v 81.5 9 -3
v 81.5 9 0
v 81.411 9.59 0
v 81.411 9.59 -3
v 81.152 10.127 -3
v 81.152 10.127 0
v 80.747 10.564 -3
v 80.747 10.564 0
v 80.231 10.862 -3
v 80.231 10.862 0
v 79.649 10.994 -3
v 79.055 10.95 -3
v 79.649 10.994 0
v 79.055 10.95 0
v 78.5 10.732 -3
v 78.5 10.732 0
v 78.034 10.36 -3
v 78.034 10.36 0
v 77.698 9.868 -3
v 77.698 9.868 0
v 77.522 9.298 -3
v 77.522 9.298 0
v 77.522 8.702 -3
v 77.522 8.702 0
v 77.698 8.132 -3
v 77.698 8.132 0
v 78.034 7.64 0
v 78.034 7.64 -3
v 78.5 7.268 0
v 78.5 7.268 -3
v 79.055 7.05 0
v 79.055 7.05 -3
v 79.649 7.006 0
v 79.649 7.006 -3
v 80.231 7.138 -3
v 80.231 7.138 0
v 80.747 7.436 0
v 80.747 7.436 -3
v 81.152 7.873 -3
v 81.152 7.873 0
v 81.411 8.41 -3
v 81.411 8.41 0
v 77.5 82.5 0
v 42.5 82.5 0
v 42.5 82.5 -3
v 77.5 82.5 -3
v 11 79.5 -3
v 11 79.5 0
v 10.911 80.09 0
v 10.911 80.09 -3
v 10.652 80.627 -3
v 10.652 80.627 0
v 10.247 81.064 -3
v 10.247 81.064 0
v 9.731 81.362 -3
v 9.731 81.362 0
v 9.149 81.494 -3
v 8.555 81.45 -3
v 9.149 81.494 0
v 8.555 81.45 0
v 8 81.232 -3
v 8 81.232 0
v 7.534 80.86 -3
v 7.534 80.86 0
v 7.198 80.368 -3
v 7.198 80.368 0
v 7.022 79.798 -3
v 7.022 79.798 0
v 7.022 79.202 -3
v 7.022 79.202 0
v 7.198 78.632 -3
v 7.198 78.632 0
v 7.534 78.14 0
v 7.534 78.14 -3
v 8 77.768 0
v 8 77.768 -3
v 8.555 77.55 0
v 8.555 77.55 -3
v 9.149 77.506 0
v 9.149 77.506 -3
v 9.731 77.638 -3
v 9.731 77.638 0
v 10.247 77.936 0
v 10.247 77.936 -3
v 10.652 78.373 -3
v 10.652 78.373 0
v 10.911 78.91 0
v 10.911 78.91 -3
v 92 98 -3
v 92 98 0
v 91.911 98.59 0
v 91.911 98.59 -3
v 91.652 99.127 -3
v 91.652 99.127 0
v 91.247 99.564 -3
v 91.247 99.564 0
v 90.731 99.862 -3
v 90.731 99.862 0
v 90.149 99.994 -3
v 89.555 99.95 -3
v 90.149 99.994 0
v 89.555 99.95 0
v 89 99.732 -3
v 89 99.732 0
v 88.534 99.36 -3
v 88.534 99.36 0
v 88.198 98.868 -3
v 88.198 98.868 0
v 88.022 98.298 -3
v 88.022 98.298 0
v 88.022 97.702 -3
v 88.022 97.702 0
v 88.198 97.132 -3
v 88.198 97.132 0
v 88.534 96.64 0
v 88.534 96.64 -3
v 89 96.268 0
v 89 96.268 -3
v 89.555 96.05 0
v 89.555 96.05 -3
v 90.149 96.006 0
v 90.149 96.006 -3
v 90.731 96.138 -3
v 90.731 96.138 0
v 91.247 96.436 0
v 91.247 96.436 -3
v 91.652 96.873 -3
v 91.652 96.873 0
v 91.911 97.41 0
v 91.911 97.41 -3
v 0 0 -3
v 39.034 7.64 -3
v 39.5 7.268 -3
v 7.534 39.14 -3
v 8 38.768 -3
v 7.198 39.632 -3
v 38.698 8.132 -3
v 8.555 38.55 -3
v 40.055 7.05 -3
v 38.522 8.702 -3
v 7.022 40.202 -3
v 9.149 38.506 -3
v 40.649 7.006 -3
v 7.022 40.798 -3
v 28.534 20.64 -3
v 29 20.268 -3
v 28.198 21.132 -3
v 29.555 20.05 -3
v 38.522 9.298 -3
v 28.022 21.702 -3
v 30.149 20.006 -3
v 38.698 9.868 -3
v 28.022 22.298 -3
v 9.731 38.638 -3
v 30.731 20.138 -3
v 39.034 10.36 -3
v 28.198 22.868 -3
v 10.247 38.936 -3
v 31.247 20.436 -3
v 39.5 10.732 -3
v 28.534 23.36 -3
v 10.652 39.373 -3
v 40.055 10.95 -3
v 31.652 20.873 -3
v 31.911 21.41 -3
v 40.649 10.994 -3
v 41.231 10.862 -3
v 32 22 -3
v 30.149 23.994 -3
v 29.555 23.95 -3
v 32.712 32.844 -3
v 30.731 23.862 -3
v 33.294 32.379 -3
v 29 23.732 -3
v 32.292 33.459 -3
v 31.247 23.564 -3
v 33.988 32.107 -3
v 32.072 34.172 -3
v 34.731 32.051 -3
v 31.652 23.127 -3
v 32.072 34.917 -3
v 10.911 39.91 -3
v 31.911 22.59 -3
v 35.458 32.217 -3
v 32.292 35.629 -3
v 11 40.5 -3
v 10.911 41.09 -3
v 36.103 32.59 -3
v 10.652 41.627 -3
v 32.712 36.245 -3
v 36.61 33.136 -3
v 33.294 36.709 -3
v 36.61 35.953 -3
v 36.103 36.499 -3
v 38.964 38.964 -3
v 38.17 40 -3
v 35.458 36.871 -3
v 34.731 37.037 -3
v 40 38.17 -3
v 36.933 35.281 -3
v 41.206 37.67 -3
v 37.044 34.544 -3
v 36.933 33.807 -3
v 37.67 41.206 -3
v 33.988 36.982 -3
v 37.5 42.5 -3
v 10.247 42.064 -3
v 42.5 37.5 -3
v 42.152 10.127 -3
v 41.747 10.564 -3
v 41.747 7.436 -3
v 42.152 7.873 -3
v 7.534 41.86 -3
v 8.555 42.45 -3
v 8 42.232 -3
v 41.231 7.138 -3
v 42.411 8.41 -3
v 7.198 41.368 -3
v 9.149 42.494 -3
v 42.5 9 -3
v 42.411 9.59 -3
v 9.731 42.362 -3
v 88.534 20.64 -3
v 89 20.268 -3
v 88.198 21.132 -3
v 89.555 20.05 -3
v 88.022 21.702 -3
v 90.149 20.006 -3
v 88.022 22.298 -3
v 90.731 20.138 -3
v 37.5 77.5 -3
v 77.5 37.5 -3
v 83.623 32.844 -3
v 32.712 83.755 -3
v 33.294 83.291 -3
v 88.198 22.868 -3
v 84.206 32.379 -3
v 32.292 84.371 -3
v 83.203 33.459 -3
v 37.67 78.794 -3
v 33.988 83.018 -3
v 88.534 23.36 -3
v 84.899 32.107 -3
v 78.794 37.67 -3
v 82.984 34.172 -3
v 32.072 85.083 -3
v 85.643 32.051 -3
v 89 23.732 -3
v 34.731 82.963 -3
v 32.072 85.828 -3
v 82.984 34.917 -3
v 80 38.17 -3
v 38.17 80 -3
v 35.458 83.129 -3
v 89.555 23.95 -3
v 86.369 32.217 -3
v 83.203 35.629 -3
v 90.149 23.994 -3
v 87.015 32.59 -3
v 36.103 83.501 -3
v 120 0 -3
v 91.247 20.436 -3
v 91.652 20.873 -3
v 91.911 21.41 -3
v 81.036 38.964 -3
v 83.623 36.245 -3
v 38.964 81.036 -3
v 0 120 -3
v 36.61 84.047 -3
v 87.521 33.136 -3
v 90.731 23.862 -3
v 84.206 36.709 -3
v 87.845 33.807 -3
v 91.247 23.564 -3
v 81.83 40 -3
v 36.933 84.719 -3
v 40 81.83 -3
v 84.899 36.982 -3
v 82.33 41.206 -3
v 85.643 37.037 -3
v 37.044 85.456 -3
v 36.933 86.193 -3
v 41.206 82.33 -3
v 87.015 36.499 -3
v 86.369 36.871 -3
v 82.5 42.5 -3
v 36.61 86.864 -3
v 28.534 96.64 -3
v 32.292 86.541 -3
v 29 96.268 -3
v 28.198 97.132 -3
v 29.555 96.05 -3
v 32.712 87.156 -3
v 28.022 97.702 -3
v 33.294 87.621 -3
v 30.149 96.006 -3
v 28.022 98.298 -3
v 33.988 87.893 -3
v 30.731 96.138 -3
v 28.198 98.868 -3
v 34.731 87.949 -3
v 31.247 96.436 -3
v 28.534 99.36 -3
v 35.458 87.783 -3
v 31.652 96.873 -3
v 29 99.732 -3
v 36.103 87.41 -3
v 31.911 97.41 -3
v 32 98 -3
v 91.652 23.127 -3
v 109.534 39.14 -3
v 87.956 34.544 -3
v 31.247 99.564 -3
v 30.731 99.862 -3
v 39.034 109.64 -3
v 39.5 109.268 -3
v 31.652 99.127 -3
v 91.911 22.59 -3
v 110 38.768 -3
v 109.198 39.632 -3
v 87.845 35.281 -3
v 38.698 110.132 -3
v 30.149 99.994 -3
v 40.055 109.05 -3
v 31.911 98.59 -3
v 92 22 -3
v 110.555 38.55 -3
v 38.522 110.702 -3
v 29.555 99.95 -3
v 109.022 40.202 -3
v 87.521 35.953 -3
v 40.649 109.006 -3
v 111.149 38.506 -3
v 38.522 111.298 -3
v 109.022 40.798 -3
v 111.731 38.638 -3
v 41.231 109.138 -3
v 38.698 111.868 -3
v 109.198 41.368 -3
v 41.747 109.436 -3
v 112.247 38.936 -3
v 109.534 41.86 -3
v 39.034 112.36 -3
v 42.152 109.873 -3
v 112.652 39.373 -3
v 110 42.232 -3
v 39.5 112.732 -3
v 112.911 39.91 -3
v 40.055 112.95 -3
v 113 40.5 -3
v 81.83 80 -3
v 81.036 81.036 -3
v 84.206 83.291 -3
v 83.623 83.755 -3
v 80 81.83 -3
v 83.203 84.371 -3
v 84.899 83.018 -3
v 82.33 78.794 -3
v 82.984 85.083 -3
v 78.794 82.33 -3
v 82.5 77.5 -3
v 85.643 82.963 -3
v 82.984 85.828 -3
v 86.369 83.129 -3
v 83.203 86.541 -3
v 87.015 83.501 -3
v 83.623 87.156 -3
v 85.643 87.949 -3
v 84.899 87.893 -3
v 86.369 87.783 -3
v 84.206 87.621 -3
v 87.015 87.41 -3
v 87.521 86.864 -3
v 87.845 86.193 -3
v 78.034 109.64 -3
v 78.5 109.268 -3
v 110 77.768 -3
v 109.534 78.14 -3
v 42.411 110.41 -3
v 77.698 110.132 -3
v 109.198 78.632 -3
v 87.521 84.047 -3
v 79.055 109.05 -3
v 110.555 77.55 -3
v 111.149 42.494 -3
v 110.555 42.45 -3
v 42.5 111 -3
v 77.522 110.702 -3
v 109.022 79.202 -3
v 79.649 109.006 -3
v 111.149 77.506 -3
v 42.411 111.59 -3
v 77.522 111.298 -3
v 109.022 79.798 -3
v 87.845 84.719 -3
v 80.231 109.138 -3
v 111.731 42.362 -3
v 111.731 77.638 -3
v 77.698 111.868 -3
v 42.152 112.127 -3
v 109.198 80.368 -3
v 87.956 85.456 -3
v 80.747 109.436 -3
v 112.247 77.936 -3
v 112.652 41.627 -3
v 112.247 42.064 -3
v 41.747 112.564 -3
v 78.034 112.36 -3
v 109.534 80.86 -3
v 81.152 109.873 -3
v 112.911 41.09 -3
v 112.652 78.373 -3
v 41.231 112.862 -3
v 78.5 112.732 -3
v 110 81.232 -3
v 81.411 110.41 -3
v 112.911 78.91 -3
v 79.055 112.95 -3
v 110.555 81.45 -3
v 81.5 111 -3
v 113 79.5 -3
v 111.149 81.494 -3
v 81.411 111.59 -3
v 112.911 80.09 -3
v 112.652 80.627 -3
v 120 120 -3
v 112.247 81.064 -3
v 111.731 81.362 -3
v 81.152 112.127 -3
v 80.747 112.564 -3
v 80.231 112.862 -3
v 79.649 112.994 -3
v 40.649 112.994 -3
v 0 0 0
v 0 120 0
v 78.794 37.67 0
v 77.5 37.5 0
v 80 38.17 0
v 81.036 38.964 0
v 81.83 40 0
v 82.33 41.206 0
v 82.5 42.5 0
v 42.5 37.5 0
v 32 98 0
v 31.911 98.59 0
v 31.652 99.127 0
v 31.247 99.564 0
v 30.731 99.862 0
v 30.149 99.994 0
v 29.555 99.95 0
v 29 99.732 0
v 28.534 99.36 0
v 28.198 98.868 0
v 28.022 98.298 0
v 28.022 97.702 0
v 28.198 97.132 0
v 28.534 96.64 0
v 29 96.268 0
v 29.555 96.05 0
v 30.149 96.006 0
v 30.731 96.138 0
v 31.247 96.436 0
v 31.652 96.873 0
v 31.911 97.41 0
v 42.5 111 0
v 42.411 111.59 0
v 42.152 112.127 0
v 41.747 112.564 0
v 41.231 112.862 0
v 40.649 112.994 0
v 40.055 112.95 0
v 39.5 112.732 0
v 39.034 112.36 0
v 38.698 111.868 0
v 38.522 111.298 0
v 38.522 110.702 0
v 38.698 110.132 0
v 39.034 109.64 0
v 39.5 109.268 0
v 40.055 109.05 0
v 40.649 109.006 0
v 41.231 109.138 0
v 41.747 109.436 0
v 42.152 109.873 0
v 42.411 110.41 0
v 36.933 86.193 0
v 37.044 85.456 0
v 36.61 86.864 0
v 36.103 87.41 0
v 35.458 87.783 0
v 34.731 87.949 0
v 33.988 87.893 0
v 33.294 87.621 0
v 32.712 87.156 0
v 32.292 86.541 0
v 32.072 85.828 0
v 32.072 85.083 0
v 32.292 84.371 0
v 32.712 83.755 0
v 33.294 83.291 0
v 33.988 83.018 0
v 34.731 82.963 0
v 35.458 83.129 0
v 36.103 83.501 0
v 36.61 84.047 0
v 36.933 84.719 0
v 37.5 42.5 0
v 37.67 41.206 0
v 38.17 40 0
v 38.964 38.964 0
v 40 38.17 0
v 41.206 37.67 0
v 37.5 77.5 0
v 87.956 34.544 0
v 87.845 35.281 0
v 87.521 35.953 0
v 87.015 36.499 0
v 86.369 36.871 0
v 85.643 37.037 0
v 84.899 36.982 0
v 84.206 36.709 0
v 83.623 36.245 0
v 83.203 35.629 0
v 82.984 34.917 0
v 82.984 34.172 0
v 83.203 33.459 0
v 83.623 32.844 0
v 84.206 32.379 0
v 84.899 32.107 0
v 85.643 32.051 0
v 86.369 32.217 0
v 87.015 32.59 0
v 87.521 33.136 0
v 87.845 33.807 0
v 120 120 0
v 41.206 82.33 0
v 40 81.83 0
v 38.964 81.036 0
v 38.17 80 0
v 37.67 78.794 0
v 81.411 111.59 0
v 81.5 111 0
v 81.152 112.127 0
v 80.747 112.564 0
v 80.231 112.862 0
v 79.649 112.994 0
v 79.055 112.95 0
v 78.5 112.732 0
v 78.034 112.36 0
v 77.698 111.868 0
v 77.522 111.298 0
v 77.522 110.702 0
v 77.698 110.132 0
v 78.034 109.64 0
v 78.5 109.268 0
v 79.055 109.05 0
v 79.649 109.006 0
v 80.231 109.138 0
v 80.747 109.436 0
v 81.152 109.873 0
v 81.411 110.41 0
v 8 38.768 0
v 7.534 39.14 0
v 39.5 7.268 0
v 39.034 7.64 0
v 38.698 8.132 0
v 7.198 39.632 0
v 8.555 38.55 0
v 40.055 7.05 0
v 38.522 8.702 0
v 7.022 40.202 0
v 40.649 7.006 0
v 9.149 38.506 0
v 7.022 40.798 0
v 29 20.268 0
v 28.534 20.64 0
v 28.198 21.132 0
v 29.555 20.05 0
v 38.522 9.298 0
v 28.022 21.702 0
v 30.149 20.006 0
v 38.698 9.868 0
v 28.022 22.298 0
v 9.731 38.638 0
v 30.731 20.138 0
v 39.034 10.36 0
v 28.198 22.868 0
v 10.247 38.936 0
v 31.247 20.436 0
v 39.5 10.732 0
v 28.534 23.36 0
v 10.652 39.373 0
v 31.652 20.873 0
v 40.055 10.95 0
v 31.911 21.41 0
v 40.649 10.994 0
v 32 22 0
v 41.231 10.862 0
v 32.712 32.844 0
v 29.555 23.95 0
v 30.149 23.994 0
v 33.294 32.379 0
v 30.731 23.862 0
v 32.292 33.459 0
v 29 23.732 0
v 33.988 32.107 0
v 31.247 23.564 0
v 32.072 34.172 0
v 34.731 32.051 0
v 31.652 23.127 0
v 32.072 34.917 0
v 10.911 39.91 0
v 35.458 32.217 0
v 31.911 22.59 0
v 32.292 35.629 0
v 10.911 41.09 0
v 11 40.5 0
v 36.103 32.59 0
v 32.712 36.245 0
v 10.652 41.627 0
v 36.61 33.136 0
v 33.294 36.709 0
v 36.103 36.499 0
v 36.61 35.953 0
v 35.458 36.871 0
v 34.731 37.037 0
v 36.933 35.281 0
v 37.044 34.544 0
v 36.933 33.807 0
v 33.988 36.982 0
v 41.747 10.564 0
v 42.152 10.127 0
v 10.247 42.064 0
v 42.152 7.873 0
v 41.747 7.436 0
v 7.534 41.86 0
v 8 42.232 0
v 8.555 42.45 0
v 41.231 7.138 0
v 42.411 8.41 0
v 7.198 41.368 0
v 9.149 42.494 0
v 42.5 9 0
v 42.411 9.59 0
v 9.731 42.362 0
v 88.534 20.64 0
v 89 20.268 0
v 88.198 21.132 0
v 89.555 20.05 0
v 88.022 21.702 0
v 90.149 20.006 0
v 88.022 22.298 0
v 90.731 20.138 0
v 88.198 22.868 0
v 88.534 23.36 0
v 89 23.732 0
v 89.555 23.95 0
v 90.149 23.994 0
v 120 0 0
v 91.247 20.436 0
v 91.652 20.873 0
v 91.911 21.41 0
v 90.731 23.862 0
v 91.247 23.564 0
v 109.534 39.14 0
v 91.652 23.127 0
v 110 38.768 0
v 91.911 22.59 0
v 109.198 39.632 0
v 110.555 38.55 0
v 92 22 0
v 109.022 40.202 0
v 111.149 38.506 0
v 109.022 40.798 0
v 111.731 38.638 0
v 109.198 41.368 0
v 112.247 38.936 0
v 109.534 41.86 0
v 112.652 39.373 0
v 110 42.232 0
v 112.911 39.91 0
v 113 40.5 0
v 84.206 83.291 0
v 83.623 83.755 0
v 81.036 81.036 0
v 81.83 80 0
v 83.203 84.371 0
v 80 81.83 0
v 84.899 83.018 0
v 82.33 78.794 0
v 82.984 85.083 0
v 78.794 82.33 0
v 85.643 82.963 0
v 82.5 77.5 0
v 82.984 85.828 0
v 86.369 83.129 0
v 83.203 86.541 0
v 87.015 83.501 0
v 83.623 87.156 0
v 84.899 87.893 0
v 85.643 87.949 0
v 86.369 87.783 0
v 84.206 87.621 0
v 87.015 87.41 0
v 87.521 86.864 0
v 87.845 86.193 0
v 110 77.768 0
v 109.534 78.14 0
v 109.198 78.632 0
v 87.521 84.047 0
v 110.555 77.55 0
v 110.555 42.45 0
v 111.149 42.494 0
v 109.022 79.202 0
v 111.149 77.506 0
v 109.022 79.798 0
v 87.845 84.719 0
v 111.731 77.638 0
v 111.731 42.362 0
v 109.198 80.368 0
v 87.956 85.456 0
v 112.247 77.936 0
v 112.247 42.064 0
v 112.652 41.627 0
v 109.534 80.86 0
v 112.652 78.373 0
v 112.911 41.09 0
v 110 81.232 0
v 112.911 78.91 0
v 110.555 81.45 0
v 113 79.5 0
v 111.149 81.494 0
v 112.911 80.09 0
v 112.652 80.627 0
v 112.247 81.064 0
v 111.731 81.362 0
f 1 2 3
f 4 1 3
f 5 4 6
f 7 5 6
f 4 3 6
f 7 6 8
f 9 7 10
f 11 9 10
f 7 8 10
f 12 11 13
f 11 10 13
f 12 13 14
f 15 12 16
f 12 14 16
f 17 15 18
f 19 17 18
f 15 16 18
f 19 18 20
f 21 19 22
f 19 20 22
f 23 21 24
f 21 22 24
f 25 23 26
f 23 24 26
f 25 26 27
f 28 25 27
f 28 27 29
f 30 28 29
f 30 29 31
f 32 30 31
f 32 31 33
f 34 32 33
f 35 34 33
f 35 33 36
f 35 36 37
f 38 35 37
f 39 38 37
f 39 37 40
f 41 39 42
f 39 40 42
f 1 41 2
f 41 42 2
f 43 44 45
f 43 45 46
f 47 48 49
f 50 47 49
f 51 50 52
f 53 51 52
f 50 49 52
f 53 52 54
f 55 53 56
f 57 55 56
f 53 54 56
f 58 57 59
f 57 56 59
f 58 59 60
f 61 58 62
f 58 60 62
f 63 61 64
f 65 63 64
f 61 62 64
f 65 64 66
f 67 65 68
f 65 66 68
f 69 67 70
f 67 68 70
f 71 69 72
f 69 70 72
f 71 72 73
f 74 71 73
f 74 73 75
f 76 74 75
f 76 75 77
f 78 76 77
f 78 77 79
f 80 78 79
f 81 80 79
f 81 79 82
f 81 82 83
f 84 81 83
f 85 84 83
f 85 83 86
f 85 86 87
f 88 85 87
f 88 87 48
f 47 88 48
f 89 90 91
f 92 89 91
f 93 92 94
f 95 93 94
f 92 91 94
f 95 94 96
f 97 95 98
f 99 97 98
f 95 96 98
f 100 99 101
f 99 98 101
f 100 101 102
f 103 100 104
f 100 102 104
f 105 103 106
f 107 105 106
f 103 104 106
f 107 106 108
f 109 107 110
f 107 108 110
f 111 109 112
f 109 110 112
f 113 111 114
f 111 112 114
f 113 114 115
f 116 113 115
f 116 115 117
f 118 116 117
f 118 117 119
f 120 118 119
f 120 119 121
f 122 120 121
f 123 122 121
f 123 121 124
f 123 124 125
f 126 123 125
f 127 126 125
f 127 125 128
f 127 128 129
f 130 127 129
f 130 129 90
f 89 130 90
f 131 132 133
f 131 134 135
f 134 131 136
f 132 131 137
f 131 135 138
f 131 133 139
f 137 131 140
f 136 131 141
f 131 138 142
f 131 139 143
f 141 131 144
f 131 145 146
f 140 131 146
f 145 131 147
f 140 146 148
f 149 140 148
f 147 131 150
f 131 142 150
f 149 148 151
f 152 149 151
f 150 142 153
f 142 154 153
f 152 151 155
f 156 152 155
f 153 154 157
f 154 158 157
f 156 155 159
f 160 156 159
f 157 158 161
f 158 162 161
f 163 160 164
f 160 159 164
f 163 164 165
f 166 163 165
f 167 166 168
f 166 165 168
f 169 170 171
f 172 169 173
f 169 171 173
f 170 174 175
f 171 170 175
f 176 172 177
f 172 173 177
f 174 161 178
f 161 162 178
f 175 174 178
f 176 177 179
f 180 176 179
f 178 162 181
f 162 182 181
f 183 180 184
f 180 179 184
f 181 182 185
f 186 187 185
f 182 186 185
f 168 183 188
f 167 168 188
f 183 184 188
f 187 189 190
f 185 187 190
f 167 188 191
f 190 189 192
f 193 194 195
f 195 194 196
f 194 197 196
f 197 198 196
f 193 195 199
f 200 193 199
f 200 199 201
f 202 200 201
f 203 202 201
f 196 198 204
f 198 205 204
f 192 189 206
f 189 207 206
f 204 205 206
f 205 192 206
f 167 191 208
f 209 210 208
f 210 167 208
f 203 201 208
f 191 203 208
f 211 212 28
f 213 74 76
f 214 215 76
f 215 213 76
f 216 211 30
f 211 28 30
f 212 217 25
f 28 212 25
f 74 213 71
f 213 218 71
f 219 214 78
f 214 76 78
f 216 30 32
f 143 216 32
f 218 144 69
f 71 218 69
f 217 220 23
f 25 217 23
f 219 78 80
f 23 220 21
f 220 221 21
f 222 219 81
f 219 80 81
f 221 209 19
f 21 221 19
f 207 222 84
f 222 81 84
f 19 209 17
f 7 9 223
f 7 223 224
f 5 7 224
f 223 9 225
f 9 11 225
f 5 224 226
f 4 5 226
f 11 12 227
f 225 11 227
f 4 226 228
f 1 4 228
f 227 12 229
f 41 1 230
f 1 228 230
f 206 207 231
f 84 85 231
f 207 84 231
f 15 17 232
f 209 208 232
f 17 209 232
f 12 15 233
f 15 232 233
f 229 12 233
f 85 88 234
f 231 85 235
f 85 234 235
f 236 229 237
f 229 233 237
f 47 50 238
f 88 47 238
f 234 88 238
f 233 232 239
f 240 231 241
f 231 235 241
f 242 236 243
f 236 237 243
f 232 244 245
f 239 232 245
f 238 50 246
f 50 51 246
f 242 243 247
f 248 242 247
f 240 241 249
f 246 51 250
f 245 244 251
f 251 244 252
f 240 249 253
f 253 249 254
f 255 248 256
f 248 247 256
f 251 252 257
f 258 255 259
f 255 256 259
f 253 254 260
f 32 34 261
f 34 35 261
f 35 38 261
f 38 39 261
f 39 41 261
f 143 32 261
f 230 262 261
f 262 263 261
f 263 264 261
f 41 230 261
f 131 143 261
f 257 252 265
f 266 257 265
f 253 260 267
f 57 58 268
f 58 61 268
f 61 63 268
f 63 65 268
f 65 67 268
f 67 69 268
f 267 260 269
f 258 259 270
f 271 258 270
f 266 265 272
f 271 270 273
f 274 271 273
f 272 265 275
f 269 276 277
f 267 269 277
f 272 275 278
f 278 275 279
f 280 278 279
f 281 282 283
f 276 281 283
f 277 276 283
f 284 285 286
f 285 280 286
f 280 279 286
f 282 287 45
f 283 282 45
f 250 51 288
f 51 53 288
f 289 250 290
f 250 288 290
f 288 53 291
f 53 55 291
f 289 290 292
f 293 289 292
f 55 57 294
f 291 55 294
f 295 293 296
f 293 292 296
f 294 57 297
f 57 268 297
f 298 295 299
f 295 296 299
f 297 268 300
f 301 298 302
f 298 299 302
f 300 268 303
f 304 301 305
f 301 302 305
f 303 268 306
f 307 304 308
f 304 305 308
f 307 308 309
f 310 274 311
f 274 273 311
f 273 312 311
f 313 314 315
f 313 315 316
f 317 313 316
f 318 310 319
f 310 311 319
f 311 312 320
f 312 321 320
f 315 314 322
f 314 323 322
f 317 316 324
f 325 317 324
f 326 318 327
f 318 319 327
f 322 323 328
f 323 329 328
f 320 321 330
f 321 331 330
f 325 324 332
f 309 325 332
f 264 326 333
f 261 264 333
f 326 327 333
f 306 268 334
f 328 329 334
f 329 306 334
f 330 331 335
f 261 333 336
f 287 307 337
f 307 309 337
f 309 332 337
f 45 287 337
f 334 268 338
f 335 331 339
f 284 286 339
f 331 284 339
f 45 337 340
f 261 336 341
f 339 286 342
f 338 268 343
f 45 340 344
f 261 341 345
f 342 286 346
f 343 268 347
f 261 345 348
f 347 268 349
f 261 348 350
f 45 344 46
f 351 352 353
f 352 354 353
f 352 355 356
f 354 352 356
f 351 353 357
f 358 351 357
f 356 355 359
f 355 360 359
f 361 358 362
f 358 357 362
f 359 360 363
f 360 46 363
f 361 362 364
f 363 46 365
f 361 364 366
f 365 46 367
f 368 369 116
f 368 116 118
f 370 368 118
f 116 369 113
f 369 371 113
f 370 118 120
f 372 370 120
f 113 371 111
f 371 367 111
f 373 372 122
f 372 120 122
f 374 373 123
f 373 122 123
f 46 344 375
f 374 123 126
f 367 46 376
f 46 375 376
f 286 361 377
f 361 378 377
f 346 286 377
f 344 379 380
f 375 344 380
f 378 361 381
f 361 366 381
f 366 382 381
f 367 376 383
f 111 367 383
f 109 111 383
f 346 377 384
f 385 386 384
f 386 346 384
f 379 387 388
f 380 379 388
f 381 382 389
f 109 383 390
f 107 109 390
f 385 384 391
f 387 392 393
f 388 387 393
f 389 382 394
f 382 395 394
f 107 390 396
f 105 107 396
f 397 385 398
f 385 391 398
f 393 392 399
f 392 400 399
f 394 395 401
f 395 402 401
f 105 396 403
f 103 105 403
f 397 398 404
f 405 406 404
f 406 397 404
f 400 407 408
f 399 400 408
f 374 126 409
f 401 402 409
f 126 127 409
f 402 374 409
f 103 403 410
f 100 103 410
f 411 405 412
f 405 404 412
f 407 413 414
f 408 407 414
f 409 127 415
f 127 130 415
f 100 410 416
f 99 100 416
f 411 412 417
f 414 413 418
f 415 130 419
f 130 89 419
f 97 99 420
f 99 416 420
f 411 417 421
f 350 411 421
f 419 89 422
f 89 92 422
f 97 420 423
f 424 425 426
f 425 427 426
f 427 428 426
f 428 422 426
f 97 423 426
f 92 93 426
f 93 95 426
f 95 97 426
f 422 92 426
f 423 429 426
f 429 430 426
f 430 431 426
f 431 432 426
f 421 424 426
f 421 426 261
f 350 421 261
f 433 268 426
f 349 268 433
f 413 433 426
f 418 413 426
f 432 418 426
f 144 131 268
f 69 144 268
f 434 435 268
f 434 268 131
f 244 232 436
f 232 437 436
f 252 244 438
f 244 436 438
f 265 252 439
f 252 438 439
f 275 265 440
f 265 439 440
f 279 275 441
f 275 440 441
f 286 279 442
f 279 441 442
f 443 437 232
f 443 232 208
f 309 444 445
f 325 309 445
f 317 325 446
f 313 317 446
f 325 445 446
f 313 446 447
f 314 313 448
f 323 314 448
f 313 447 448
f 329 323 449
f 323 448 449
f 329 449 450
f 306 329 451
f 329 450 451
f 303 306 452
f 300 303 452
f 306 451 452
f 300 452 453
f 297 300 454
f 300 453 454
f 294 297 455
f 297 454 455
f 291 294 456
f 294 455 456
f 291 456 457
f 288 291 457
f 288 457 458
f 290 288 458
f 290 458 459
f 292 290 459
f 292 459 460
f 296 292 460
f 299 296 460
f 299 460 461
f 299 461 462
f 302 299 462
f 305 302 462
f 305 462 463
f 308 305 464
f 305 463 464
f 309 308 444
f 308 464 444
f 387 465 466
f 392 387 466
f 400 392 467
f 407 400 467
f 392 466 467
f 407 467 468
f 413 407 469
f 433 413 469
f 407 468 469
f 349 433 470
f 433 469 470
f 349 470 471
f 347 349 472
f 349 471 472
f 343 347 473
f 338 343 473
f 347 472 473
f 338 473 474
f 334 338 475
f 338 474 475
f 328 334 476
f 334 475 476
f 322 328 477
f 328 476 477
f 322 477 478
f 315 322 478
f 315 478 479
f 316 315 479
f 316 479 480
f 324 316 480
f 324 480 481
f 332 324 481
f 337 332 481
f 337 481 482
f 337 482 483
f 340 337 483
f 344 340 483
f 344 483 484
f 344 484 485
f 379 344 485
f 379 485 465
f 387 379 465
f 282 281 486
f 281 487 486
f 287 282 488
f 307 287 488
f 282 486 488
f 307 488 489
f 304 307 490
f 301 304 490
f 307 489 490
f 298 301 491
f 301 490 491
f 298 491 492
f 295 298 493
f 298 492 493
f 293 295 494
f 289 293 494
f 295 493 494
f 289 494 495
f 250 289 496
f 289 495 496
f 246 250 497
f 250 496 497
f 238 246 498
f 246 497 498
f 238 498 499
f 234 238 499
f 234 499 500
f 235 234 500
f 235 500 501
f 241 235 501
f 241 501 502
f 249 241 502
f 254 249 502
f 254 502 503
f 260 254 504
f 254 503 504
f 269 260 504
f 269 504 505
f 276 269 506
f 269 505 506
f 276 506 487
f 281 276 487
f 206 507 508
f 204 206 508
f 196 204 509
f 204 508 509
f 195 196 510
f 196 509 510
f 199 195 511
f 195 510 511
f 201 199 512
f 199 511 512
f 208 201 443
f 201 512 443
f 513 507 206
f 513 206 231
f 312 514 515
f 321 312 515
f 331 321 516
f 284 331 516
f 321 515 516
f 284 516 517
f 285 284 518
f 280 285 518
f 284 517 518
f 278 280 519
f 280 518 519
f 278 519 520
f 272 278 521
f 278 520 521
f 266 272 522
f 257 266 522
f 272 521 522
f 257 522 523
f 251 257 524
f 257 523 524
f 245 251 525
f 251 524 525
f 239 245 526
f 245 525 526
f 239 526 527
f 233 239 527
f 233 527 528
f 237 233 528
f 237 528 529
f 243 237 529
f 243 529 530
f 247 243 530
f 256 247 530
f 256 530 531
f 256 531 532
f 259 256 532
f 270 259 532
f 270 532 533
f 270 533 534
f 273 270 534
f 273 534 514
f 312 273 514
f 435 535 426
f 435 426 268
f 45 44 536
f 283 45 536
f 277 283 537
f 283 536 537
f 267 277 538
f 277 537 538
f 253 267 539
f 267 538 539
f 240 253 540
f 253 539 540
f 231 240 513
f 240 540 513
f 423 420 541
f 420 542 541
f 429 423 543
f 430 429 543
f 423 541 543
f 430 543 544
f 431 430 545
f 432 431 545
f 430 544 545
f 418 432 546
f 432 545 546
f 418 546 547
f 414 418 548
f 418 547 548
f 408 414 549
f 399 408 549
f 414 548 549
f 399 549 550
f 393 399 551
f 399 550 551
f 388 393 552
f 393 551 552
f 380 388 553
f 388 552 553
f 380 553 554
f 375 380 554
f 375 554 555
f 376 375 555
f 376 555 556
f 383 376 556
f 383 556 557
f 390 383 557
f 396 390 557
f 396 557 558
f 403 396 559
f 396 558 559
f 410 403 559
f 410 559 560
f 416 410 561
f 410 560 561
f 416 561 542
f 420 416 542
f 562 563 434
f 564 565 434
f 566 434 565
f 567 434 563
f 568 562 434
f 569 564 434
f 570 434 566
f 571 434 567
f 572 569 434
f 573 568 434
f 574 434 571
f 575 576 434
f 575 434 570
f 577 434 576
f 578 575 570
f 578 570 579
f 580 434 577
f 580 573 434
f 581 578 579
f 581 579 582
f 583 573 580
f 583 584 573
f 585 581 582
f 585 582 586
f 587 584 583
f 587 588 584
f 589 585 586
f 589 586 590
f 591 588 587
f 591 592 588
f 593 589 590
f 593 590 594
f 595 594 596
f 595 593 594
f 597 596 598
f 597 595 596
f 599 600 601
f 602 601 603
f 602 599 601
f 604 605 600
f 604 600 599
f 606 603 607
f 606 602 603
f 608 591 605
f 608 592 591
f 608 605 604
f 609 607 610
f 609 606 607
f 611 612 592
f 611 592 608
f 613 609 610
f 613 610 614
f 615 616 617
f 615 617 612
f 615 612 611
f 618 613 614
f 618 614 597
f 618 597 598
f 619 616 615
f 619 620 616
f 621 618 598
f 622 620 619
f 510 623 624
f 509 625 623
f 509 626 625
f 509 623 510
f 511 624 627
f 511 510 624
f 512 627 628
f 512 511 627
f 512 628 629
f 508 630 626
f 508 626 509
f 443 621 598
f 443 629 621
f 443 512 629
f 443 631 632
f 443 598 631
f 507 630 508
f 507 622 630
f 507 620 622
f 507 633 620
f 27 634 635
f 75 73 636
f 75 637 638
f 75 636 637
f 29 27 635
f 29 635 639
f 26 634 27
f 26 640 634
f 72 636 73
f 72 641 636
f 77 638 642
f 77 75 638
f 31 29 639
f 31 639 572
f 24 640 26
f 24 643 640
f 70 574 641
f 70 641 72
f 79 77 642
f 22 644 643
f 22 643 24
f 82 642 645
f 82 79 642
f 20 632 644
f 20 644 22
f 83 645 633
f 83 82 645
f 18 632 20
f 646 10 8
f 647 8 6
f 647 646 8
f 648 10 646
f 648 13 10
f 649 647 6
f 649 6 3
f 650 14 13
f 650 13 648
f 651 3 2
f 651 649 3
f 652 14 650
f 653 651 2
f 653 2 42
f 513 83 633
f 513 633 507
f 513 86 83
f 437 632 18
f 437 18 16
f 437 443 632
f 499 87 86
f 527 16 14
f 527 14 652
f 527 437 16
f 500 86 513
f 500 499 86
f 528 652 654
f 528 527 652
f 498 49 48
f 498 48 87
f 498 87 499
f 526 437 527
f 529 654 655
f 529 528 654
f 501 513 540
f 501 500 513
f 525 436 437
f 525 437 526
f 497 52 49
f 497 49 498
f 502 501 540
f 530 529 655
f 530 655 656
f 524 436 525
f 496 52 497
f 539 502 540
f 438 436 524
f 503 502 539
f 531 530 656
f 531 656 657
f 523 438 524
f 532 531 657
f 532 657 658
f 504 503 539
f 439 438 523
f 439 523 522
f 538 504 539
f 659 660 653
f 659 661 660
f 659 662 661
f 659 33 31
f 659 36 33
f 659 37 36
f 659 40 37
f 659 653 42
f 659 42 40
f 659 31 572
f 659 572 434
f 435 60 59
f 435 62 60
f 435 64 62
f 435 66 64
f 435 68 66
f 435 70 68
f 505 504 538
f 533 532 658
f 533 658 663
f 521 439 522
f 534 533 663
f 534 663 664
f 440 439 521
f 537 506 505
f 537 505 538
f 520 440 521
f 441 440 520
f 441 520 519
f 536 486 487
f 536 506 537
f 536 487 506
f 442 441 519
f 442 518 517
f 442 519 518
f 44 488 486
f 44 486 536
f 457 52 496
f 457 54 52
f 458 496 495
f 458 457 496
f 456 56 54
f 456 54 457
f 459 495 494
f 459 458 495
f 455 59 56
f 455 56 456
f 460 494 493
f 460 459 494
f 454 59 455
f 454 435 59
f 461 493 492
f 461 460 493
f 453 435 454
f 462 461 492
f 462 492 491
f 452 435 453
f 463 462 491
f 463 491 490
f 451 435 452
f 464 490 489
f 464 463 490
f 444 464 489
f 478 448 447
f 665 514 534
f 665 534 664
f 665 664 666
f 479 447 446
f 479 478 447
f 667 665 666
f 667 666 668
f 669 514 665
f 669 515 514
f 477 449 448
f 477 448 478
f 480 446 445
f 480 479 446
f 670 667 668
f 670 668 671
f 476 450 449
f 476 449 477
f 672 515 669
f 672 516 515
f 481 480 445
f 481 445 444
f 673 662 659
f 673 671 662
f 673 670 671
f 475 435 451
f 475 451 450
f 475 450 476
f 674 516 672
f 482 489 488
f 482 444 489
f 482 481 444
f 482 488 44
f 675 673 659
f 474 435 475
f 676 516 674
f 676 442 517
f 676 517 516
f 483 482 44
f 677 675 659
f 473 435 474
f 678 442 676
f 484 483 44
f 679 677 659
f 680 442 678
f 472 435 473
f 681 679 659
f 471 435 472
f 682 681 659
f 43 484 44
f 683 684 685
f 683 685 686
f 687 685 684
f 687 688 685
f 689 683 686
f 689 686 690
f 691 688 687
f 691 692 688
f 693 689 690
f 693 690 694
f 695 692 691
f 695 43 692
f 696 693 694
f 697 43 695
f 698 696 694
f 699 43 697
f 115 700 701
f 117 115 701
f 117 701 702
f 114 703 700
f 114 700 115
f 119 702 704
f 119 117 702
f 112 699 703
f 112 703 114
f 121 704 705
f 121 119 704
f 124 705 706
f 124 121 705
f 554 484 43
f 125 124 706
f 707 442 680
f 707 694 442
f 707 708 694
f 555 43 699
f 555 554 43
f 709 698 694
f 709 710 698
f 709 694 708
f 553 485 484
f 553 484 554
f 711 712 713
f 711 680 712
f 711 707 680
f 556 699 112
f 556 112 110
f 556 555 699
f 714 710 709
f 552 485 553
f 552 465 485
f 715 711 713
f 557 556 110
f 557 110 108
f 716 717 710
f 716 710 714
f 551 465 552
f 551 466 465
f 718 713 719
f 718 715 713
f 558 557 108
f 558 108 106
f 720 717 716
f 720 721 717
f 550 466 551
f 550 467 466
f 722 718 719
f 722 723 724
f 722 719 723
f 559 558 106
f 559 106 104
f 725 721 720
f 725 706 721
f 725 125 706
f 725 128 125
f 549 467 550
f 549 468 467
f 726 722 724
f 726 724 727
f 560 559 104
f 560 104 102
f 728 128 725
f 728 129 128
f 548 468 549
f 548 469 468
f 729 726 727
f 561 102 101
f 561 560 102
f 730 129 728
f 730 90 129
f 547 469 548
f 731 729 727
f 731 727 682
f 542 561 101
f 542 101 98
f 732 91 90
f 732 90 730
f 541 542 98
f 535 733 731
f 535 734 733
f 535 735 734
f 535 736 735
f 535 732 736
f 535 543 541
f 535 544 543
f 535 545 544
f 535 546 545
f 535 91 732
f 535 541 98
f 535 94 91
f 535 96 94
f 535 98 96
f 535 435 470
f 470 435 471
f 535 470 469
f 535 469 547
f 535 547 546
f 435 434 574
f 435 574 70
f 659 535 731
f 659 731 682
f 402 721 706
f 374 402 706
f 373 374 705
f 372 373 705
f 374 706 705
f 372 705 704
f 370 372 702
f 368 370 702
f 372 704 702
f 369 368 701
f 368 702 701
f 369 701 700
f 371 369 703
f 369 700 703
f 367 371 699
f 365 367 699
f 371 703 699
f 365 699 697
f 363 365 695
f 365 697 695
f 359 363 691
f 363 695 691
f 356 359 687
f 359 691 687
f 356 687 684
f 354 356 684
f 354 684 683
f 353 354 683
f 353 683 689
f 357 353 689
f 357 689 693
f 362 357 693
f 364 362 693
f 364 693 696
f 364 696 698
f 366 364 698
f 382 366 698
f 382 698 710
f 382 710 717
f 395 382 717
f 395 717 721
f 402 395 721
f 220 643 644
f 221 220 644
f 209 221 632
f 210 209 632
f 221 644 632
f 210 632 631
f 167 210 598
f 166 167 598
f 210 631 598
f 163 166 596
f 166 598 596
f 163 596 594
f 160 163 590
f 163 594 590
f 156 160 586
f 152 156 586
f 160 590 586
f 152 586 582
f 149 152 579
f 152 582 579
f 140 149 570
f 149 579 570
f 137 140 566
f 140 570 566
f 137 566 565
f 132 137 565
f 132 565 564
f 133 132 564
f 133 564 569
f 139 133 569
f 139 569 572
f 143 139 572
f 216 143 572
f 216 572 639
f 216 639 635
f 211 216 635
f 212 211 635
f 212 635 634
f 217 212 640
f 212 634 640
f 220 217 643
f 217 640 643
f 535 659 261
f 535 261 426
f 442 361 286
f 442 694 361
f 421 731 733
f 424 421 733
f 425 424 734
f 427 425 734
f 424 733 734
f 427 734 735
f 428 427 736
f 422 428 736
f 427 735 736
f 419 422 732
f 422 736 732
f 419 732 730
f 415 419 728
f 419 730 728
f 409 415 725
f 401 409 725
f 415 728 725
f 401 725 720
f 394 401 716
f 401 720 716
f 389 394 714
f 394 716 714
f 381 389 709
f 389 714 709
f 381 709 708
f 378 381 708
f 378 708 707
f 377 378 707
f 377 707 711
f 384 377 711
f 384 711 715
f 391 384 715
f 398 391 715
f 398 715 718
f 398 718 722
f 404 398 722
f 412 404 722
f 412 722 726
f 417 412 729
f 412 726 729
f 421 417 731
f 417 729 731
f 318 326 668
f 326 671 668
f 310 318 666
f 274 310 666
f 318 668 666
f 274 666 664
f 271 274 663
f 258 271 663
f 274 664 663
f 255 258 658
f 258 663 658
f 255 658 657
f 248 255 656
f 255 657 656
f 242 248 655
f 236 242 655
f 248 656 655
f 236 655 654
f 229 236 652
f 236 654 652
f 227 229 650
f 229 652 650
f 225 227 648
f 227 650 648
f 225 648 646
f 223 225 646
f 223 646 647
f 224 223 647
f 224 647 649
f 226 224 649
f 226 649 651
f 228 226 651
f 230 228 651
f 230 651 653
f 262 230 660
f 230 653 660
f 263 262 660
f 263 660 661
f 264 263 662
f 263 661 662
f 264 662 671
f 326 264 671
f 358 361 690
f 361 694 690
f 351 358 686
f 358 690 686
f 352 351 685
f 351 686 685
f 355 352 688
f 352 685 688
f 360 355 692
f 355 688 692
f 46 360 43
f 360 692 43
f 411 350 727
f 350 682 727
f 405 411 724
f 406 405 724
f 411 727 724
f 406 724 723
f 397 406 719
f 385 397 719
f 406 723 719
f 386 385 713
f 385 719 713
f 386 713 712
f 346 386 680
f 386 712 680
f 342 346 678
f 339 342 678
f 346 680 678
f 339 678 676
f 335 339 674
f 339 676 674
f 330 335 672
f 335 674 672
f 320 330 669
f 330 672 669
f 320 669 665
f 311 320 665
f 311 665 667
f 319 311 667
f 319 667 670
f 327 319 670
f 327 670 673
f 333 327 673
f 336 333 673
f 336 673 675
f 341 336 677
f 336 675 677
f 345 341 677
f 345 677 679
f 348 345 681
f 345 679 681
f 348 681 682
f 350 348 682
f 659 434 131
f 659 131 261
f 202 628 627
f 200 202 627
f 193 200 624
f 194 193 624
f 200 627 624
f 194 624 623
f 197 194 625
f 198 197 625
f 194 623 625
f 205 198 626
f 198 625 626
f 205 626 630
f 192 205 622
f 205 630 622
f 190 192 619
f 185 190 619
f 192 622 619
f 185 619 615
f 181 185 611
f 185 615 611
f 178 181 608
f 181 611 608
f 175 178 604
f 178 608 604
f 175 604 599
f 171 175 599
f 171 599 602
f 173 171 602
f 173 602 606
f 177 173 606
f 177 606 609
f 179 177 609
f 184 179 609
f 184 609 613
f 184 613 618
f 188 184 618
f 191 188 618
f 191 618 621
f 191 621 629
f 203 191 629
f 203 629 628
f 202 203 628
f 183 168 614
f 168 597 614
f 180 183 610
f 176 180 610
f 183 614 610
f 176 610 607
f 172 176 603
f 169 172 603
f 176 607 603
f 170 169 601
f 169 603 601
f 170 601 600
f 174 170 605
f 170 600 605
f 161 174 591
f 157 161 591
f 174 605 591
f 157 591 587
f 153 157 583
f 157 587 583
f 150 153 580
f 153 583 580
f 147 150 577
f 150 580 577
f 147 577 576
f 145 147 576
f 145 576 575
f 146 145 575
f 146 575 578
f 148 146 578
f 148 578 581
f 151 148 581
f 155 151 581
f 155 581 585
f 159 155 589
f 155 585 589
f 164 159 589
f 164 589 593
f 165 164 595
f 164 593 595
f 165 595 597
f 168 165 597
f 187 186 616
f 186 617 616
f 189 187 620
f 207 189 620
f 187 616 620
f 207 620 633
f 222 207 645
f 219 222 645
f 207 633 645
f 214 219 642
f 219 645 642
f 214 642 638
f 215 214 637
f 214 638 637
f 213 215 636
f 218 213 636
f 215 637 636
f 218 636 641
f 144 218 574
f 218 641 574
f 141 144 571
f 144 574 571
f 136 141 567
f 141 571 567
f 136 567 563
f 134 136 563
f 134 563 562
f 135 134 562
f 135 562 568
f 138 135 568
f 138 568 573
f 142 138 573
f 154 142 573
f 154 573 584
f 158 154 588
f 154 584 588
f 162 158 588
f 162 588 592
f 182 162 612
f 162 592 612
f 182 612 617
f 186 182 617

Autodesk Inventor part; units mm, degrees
ref_plane "YZ Plane" through (0, 0, 0) normal (1, 0, 0) x (0, 1, 0)
ref_plane "XZ Plane" through (0, 0, 0) normal (0, 1, 0) x (-1, 0, 0)
ref_plane "XY Plane" through (0, 0, 0) normal (0, 0, 1) x (1, 0, 0)
sketch "Náčrt2" plane through (0, 0, 0) normal (0, 0, 1) x (1, 0, 0)
  line L0 (0, 0) -> (120, 0)
  line L1 (120, 0) -> (120, 120)
  line L2 (120, 120) -> (0, 120)
  line L3 (0, 120) -> (0, 0)
  circle A0 centre (34.5442, 85.4558) radius 2.5
  circle A1 centre (85.4558, 85.4558) radius 2.5
  circle A2 centre (34.5442, 34.5442) radius 2.5
  circle A3 centre (85.4558, 34.5442) radius 2.5
  circle A4 centre (40.5, 111) radius 2
  circle A5 centre (79.5, 111) radius 2
  circle A6 centre (9, 79.5) radius 2
  circle A7 centre (9, 40.5) radius 2
  circle A8 centre (111, 79.5) radius 2
  circle A9 centre (111, 40.5) radius 2
  circle A10 centre (79.5, 9) radius 2
  circle A11 centre (40.5, 9) radius 2
  circle A12 centre (30, 98) radius 2
  circle A13 centre (90, 98) radius 2
  circle A14 centre (90, 22) radius 2
  circle A15 centre (30, 22) radius 2
  line L4 (42.5, 82.5) -> (77.5, 82.5)
  line L5 (82.5, 77.5) -> (82.5, 42.5)
  line L6 (77.5, 37.5) -> (42.5, 37.5)
  line L7 (37.5, 42.5) -> (37.5, 77.5)
  arc A16 (37.5, 42.5) -> (42.5, 37.5) centre (42.5, 42.5) ccw
  arc A17 (77.5, 37.5) -> (82.5, 42.5) centre (77.5, 42.5) ccw
  arc A18 (42.5, 82.5) -> (37.5, 77.5) centre (42.5, 77.5) ccw
  arc A19 (82.5, 77.5) -> (77.5, 82.5) centre (77.5, 77.5) ccw
  point P0 (37.5, 82.5)
  point P1 (82.5, 37.5)
  point P2 (82.5, 82.5)
  point P3 (37.5, 37.5)
  dimension "d18" = 1
  dimension "d26" = 120
  dimension "d27" = 120
  dimension "d28" = 39
  dimension "d29" = 39
  dimension "d30" = 60
  dimension "d31" = 76
  dimension "d32" = 72
  dimension "d35" = 5
  dimension "d36" = 4
  dimension "d37" = 4
  dimension "d42" = 5
  dimension "d43" = 5
  dimension "d44" = 35
extrude "Vysunutí2" add sketch "Náčrt2" against normal blind 3
properties part number "Cougar_Base2"
